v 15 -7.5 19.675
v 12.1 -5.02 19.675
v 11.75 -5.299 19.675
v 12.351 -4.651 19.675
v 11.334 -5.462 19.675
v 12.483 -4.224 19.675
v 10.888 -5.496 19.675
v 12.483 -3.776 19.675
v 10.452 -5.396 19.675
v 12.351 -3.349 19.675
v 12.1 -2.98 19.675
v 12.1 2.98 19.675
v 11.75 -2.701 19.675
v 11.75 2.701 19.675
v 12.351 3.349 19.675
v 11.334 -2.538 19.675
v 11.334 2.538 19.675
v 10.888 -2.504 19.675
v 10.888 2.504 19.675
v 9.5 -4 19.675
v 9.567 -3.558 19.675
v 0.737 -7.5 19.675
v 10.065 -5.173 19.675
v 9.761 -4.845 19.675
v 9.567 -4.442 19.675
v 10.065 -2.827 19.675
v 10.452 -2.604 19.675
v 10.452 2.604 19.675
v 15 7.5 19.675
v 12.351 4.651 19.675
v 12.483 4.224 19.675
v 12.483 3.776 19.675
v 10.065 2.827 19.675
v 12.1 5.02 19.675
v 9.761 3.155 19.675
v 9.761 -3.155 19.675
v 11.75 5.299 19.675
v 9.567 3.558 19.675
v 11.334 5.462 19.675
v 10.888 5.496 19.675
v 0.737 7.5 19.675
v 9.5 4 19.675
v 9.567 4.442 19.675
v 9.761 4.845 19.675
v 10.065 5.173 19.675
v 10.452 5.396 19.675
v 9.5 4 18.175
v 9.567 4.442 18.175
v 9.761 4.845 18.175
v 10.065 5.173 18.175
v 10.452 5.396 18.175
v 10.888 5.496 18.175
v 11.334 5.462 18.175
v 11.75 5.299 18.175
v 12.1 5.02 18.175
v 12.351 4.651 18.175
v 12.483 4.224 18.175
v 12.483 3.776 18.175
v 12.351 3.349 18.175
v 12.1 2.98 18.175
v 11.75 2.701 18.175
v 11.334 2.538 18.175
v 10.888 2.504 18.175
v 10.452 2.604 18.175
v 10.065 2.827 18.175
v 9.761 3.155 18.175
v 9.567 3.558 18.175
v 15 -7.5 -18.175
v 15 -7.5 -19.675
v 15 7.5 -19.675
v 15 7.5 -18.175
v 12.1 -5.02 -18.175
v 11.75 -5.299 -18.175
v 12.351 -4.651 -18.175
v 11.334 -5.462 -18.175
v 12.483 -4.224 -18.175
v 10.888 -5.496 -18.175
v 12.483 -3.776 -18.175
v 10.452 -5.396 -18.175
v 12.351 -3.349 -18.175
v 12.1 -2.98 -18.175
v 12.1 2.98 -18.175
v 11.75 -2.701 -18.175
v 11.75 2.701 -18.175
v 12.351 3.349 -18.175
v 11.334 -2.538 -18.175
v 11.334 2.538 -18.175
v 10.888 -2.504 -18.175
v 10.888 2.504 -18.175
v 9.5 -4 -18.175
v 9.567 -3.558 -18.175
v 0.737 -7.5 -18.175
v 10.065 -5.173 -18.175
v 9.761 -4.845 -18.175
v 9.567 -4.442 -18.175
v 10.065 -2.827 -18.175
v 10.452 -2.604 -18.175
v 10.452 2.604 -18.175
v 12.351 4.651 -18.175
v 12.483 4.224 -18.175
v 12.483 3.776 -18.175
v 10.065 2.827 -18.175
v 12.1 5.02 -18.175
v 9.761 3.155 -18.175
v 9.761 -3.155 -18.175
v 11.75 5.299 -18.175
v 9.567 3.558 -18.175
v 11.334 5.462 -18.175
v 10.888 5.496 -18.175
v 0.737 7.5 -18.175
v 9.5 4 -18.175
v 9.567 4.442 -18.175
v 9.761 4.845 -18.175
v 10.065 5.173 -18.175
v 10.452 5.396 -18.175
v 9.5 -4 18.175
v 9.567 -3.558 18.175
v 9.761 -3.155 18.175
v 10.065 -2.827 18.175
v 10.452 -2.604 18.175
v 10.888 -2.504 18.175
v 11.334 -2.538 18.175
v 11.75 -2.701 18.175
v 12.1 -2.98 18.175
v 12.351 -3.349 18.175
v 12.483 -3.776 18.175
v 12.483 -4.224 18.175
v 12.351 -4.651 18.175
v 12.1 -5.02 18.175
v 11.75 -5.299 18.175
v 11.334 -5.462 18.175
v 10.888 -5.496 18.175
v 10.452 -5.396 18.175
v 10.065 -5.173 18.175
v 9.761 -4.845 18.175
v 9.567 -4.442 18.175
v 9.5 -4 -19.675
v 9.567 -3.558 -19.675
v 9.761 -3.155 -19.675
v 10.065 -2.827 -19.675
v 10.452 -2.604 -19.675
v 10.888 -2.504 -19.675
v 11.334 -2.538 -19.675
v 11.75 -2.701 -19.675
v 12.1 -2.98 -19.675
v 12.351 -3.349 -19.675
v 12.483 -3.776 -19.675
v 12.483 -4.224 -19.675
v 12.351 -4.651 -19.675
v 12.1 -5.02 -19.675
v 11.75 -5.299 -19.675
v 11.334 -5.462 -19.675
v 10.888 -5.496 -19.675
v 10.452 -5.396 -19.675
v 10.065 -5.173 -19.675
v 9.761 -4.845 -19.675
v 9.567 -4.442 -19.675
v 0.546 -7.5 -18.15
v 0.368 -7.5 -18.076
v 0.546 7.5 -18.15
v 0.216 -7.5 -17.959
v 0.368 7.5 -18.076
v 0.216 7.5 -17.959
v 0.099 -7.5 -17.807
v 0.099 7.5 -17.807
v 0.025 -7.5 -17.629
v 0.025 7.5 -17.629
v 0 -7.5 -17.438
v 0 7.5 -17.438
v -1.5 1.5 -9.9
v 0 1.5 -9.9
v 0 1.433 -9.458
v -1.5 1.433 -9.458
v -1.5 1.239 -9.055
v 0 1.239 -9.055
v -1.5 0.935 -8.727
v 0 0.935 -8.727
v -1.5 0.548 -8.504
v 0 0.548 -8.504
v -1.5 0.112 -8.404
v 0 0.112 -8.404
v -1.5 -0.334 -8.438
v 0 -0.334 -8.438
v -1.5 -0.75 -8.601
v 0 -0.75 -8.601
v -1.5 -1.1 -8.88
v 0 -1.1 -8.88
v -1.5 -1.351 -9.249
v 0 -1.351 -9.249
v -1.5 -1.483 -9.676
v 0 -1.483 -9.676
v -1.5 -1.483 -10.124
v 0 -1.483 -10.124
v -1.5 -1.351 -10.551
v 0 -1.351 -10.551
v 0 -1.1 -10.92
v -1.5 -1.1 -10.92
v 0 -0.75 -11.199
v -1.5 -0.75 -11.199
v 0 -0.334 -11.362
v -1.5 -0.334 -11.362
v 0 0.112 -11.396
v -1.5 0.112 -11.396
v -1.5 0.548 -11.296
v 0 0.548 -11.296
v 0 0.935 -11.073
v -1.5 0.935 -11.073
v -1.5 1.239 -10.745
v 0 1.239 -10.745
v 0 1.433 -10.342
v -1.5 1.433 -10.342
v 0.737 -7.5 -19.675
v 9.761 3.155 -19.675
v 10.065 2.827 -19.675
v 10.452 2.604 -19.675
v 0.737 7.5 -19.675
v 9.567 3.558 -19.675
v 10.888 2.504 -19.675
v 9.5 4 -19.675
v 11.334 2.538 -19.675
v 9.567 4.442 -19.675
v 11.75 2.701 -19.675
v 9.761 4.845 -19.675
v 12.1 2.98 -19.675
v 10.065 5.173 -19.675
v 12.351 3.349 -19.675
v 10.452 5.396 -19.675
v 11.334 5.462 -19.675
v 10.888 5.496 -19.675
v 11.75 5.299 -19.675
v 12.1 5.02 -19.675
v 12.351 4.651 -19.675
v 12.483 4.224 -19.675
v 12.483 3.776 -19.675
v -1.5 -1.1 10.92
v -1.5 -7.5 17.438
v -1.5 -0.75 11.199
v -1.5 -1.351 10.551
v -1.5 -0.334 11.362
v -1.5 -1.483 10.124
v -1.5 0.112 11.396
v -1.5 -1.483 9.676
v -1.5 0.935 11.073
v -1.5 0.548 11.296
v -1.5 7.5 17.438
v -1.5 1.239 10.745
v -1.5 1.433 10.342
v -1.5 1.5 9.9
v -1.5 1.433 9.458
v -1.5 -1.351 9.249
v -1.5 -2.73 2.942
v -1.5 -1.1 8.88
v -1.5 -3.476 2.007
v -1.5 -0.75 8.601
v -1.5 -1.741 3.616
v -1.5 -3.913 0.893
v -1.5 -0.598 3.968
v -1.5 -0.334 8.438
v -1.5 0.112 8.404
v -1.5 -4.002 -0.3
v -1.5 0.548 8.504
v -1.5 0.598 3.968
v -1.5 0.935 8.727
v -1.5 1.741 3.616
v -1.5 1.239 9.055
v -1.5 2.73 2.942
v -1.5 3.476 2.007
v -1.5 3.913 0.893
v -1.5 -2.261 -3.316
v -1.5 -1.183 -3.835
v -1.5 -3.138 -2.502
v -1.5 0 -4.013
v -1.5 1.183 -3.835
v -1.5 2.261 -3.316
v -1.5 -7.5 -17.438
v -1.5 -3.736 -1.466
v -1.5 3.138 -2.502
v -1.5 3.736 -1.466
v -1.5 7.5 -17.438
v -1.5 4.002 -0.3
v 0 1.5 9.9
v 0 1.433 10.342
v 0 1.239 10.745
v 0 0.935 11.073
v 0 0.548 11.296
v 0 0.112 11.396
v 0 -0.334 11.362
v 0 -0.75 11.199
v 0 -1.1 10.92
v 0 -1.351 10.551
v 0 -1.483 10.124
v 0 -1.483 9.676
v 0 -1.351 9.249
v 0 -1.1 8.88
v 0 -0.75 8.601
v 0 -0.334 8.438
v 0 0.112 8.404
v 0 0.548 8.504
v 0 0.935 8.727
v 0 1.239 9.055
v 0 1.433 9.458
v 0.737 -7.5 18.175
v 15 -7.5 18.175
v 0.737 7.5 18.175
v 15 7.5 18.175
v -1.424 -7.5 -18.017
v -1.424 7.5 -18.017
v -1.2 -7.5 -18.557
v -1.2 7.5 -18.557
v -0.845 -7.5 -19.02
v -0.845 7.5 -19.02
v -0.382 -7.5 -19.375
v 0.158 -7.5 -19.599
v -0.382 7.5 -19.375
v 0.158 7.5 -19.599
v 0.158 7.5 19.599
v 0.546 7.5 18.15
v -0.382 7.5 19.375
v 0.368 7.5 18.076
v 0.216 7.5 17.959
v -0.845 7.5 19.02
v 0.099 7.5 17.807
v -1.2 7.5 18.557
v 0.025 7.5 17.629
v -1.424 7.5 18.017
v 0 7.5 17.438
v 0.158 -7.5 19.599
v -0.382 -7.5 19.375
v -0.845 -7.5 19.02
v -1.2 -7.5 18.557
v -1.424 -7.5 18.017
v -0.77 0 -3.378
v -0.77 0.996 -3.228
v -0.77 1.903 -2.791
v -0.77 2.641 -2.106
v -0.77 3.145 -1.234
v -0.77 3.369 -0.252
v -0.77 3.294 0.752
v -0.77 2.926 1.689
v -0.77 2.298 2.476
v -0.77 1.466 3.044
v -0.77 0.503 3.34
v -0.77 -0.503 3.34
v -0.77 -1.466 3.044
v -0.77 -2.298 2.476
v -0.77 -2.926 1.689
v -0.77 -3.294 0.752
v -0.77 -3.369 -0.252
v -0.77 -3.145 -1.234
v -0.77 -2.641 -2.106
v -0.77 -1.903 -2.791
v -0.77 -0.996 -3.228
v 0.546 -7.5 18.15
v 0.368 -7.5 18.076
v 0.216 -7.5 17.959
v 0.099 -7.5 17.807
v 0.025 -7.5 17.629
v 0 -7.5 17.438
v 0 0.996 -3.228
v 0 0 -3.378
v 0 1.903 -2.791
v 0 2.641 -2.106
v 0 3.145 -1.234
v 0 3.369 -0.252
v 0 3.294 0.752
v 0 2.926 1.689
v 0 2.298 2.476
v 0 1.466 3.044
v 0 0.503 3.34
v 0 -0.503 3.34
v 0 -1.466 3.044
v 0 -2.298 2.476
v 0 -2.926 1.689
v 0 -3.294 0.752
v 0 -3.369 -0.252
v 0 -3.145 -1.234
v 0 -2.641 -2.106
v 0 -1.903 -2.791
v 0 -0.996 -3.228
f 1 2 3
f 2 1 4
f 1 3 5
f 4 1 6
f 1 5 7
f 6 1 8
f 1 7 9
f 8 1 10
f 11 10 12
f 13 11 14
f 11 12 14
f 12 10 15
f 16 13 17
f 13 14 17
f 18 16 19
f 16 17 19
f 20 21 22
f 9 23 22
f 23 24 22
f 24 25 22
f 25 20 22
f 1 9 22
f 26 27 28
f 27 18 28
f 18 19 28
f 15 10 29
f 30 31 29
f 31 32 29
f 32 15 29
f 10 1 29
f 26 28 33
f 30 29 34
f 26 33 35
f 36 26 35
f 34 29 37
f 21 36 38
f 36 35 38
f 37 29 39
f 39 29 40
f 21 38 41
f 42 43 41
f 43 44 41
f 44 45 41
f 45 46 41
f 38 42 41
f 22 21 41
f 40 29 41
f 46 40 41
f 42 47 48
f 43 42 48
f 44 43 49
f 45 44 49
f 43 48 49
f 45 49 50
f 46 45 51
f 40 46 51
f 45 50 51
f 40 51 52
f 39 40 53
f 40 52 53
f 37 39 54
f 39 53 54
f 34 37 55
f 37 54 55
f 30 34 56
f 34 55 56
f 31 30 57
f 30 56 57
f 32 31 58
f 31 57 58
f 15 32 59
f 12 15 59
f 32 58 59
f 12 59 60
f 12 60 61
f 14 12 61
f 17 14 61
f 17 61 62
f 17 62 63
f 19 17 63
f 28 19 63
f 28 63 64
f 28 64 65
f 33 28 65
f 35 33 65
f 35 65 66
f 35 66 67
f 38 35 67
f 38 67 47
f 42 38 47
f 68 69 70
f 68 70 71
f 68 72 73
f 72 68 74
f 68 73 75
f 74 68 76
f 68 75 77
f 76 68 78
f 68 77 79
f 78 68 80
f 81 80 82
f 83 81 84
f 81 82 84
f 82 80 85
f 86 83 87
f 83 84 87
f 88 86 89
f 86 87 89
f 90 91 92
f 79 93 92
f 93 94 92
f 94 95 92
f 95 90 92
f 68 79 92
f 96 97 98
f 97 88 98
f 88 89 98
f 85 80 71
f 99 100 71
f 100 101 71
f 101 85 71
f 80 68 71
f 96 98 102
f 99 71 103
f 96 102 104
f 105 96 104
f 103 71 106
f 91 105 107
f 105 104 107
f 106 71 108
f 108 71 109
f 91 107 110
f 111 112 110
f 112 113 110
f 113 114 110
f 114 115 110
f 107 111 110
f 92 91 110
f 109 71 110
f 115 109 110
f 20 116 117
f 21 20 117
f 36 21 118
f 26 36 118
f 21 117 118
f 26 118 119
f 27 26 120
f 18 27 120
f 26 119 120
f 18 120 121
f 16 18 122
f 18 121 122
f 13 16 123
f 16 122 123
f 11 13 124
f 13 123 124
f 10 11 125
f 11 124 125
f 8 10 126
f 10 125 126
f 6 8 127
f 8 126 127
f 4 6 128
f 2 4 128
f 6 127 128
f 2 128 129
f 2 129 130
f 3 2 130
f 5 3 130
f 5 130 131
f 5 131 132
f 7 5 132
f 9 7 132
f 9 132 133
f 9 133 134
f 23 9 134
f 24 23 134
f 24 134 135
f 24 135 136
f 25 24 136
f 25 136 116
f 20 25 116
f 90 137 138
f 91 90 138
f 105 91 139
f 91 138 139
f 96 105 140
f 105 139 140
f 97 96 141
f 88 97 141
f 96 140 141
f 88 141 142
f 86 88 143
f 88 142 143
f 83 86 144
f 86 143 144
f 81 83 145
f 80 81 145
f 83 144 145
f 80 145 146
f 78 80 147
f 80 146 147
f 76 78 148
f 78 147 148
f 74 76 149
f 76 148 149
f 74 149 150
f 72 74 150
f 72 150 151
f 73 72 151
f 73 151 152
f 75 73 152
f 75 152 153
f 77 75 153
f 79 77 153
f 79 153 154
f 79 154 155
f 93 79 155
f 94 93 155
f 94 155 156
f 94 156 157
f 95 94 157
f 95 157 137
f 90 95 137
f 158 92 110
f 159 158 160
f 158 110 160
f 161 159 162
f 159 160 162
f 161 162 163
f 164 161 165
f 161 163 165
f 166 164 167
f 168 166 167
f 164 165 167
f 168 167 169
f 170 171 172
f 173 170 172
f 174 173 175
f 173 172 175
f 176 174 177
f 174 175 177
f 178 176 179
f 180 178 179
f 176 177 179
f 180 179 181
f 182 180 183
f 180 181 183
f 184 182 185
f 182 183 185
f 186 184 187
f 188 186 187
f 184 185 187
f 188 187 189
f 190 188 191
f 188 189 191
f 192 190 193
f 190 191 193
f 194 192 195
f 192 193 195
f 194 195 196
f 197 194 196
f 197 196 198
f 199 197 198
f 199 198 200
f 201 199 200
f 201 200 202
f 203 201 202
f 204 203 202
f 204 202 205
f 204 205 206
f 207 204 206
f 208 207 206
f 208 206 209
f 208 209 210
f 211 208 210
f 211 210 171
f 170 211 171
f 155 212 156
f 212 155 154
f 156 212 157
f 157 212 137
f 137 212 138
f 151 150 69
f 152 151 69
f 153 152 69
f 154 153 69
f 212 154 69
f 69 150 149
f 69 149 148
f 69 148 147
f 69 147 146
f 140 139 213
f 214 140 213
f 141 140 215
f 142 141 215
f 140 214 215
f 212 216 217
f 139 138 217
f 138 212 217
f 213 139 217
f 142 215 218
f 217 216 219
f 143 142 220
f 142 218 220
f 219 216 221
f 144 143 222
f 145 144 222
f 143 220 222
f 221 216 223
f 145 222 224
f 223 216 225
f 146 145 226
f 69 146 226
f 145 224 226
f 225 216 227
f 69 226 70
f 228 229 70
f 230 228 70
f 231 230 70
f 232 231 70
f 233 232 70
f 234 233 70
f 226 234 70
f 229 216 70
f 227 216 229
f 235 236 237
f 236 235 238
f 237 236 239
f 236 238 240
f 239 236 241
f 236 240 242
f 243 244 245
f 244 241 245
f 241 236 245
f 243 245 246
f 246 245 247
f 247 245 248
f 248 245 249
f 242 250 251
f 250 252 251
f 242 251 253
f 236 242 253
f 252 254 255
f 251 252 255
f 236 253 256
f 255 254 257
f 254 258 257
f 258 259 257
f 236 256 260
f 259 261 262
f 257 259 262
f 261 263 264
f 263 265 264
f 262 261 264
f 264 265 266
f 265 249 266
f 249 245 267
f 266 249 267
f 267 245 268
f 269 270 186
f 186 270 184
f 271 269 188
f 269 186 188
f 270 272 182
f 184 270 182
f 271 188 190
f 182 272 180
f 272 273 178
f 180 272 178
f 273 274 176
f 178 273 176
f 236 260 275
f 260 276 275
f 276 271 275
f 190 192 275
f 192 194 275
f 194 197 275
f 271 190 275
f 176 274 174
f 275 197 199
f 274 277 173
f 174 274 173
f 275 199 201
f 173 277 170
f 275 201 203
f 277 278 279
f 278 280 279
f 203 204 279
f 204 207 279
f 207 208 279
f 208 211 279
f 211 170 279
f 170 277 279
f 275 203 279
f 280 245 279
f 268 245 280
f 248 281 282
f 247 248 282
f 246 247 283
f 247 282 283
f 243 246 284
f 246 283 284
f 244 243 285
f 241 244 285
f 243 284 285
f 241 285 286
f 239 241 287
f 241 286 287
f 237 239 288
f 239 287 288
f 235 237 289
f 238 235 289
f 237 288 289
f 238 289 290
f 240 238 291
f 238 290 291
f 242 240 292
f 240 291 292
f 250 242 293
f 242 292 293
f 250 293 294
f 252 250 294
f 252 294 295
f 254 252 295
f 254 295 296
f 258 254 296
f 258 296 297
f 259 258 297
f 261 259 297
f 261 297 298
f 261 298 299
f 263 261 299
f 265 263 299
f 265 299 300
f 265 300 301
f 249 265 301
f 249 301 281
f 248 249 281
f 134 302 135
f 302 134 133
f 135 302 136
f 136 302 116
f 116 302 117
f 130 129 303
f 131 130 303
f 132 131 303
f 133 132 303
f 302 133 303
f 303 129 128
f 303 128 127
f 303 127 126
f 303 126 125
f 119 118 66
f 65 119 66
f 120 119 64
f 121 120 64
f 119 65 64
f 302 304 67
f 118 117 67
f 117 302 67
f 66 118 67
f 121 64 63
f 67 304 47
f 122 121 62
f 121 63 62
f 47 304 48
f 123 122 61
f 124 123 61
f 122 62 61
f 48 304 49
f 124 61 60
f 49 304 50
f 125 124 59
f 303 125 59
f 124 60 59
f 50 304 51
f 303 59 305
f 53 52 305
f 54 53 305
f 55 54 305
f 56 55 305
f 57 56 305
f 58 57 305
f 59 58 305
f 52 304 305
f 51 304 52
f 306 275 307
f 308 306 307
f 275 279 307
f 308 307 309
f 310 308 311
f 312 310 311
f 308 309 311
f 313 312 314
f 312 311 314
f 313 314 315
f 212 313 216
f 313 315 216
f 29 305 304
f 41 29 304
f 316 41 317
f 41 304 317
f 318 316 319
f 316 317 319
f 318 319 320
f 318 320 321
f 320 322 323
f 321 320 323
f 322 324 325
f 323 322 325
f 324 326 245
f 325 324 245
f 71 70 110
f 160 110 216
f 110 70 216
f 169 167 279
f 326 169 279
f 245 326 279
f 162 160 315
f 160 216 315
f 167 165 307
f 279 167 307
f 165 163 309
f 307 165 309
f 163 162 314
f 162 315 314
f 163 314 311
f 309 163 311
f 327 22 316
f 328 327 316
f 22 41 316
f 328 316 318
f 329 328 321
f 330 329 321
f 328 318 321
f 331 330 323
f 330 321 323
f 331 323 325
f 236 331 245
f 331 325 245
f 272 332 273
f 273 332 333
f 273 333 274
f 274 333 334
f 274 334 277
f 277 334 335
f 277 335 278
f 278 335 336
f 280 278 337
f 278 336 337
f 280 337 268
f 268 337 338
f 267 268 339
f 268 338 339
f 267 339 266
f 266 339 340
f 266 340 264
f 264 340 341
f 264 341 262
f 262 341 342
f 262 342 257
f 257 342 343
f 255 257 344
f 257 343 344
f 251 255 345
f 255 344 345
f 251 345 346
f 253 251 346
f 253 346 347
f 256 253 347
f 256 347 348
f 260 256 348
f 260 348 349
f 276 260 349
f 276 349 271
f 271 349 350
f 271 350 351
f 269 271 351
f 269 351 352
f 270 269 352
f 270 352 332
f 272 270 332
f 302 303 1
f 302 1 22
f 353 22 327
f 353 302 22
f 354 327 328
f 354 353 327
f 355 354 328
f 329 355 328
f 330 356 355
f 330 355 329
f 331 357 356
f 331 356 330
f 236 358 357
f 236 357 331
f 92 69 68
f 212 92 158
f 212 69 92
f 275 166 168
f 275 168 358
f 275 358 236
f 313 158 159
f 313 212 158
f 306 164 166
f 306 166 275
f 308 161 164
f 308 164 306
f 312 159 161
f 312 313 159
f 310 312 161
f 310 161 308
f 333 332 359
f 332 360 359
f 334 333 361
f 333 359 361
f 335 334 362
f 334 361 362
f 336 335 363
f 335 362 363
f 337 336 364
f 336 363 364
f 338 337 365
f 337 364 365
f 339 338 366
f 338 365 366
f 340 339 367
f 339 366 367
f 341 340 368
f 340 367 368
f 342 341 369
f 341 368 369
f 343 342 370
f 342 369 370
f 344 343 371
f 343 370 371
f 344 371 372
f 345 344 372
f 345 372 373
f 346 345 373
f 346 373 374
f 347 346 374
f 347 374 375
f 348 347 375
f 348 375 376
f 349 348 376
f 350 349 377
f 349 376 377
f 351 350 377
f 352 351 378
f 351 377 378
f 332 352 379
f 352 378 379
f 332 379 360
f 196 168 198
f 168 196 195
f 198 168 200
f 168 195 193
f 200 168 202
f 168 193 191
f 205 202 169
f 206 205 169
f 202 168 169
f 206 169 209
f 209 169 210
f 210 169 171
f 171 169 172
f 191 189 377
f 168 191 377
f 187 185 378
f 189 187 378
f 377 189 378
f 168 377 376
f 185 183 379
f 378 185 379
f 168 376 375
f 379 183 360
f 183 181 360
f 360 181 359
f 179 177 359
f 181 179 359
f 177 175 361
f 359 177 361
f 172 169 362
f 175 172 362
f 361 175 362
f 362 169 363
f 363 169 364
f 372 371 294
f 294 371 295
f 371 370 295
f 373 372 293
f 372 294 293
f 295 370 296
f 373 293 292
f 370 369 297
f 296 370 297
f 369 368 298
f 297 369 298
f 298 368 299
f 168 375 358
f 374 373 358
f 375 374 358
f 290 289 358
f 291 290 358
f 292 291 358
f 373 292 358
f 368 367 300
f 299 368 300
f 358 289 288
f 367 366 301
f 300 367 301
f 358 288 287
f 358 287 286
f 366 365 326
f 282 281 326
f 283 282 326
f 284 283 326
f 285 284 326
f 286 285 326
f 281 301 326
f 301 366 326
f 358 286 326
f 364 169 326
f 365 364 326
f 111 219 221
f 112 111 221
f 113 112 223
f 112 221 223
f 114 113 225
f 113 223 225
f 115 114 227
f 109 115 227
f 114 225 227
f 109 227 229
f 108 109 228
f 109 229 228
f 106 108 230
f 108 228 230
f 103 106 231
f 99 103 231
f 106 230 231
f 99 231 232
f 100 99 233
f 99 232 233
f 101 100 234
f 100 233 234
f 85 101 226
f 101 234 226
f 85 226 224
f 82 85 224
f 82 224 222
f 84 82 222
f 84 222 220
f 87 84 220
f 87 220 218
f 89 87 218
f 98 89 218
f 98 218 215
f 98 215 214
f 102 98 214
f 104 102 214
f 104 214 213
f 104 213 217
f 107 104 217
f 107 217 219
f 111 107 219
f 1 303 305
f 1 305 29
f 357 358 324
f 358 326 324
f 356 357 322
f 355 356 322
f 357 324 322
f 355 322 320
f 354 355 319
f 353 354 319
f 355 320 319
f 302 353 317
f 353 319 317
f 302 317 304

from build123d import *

# Parameters (mm, degrees)
BRIDA_BASE2_DEPTH                       = 7.5
CROQUIS10_R                             = 1.5
CORTAR_EXTRUIR1_DEPTH                   = 43.774671244
CORTAR_EXTRUIR2_REACH                   = 27.853
CROQUIS13_R                             = 1.5
TALADRO_DE_MARGEN_PARA_1_41_D           = 6.7564
TALADRO_DE_MARGEN_PARA_1_41_DEPTH       = 3.65
TALADRO_DE_MARGEN_PARA_1_41_CSINK_D     = 8.0264
TALADRO_DE_MARGEN_PARA_1_41_CSINK_ANGLE = 82
TALADRO_DE_MARGEN_PARA_1_41_TIP         = 2.029827343


# Sheet-metal steps are written as plain solids
with BuildPart() as part:
    # Croquis1 → Brida base2 (new, symmetric)
    with BuildSketch(Plane(origin=(122.052362923, 0, 0), x_dir=(1, 0, 0), z_dir=(0, 1, 0))):
        with BuildLine():
            Line((-107.052362923, 18.175), (-121.315762923, 18.175))
            ThreePointArc((-121.315762923, 18.175), (-121.836617778, 17.959254855), (-122.052362923, 17.4384))
            Line((-122.052362923, 17.4384), (-122.052362923, -17.4384))
            ThreePointArc((-122.052362923, -17.4384), (-121.836617778, -17.959254855), (-121.315762923, -18.175))
            Line((-121.315762923, -18.175), (-107.052362923, -18.175))
            Line((-107.052362923, -18.175), (-107.052362923, -19.675))
            Line((-107.052362923, -19.675), (-121.315762923, -19.675))
            ThreePointArc((-121.315762923, -19.675), (-122.89727795, -19.019915027), (-123.552362923, -17.4384))
            Line((-123.552362923, -17.4384), (-123.552362923, 17.4384))
            ThreePointArc((-123.552362923, 17.4384), (-122.89727795, 19.019915027), (-121.315762923, 19.675))
            Line((-121.315762923, 19.675), (-107.052362923, 19.675))
            Line((-107.052362923, 19.675), (-107.052362923, 18.175))
        make_face()
    extrude(amount=BRIDA_BASE2_DEPTH, both=True)

    # Croquis10 → Cortar-Extruir1 (cut, through all)
    with BuildSketch(Plane(origin=(0, 0, -19.675), x_dir=(-1, 0, 0), z_dir=(0, 0, -1))):
        with Locations((-11, 4)):
            Circle(CROQUIS10_R)
        with Locations((-11, -4)):
            Circle(CROQUIS10_R)
    extrude(amount=-CORTAR_EXTRUIR1_DEPTH, mode=Mode.SUBTRACT)

    # Croquis13 → Cortar-Extruir2 (cut, up to next)
    with BuildSketch(Plane(origin=(0, 0, 0), x_dir=(0, 0, 1), z_dir=(1, 0, 0)), mode=Mode.PRIVATE) as cortar_extruir2_sk1:
        with Locations(Location((-9.9, 0, 0), (0, 0, 270))):
            Circle(CROQUIS13_R)
    cortar_extruir2_tool1 = extrude(cortar_extruir2_sk1.sketch, amount=-CORTAR_EXTRUIR2_REACH, mode=Mode.PRIVATE) & part.part
    # Croquis13 → Cortar-Extruir2 (cut, up to next)
    with BuildSketch(Plane(origin=(0, 0, 0), x_dir=(0, 0, 1), z_dir=(1, 0, 0)), mode=Mode.PRIVATE) as cortar_extruir2_sk2:
        with Locations(Location((9.9, 0, 0), (0, 0, 270))):
            Circle(CROQUIS13_R)
    cortar_extruir2_tool2 = extrude(cortar_extruir2_sk2.sketch, amount=-CORTAR_EXTRUIR2_REACH, mode=Mode.PRIVATE) & part.part
    add(cortar_extruir2_tool1.solids().sort_by_distance((0, 0, -9.9))[0], mode=Mode.SUBTRACT)
    add(cortar_extruir2_tool2.solids().sort_by_distance((0, 0, 9.9))[0], mode=Mode.SUBTRACT)

    # Taladro de margen para 1/41
    with Locations(Plane.ZY.offset(1.5)):
        with Locations((0, 0)):
            CounterSinkHole(TALADRO_DE_MARGEN_PARA_1_41_D / 2, TALADRO_DE_MARGEN_PARA_1_41_CSINK_D / 2, depth=TALADRO_DE_MARGEN_PARA_1_41_DEPTH, counter_sink_angle=TALADRO_DE_MARGEN_PARA_1_41_CSINK_ANGLE)
            with Locations((0, 0, -(TALADRO_DE_MARGEN_PARA_1_41_DEPTH + TALADRO_DE_MARGEN_PARA_1_41_TIP / 2))):  # 118° drill point
                Cone(0, TALADRO_DE_MARGEN_PARA_1_41_D / 2, TALADRO_DE_MARGEN_PARA_1_41_TIP, mode=Mode.SUBTRACT)


solid = part.part
